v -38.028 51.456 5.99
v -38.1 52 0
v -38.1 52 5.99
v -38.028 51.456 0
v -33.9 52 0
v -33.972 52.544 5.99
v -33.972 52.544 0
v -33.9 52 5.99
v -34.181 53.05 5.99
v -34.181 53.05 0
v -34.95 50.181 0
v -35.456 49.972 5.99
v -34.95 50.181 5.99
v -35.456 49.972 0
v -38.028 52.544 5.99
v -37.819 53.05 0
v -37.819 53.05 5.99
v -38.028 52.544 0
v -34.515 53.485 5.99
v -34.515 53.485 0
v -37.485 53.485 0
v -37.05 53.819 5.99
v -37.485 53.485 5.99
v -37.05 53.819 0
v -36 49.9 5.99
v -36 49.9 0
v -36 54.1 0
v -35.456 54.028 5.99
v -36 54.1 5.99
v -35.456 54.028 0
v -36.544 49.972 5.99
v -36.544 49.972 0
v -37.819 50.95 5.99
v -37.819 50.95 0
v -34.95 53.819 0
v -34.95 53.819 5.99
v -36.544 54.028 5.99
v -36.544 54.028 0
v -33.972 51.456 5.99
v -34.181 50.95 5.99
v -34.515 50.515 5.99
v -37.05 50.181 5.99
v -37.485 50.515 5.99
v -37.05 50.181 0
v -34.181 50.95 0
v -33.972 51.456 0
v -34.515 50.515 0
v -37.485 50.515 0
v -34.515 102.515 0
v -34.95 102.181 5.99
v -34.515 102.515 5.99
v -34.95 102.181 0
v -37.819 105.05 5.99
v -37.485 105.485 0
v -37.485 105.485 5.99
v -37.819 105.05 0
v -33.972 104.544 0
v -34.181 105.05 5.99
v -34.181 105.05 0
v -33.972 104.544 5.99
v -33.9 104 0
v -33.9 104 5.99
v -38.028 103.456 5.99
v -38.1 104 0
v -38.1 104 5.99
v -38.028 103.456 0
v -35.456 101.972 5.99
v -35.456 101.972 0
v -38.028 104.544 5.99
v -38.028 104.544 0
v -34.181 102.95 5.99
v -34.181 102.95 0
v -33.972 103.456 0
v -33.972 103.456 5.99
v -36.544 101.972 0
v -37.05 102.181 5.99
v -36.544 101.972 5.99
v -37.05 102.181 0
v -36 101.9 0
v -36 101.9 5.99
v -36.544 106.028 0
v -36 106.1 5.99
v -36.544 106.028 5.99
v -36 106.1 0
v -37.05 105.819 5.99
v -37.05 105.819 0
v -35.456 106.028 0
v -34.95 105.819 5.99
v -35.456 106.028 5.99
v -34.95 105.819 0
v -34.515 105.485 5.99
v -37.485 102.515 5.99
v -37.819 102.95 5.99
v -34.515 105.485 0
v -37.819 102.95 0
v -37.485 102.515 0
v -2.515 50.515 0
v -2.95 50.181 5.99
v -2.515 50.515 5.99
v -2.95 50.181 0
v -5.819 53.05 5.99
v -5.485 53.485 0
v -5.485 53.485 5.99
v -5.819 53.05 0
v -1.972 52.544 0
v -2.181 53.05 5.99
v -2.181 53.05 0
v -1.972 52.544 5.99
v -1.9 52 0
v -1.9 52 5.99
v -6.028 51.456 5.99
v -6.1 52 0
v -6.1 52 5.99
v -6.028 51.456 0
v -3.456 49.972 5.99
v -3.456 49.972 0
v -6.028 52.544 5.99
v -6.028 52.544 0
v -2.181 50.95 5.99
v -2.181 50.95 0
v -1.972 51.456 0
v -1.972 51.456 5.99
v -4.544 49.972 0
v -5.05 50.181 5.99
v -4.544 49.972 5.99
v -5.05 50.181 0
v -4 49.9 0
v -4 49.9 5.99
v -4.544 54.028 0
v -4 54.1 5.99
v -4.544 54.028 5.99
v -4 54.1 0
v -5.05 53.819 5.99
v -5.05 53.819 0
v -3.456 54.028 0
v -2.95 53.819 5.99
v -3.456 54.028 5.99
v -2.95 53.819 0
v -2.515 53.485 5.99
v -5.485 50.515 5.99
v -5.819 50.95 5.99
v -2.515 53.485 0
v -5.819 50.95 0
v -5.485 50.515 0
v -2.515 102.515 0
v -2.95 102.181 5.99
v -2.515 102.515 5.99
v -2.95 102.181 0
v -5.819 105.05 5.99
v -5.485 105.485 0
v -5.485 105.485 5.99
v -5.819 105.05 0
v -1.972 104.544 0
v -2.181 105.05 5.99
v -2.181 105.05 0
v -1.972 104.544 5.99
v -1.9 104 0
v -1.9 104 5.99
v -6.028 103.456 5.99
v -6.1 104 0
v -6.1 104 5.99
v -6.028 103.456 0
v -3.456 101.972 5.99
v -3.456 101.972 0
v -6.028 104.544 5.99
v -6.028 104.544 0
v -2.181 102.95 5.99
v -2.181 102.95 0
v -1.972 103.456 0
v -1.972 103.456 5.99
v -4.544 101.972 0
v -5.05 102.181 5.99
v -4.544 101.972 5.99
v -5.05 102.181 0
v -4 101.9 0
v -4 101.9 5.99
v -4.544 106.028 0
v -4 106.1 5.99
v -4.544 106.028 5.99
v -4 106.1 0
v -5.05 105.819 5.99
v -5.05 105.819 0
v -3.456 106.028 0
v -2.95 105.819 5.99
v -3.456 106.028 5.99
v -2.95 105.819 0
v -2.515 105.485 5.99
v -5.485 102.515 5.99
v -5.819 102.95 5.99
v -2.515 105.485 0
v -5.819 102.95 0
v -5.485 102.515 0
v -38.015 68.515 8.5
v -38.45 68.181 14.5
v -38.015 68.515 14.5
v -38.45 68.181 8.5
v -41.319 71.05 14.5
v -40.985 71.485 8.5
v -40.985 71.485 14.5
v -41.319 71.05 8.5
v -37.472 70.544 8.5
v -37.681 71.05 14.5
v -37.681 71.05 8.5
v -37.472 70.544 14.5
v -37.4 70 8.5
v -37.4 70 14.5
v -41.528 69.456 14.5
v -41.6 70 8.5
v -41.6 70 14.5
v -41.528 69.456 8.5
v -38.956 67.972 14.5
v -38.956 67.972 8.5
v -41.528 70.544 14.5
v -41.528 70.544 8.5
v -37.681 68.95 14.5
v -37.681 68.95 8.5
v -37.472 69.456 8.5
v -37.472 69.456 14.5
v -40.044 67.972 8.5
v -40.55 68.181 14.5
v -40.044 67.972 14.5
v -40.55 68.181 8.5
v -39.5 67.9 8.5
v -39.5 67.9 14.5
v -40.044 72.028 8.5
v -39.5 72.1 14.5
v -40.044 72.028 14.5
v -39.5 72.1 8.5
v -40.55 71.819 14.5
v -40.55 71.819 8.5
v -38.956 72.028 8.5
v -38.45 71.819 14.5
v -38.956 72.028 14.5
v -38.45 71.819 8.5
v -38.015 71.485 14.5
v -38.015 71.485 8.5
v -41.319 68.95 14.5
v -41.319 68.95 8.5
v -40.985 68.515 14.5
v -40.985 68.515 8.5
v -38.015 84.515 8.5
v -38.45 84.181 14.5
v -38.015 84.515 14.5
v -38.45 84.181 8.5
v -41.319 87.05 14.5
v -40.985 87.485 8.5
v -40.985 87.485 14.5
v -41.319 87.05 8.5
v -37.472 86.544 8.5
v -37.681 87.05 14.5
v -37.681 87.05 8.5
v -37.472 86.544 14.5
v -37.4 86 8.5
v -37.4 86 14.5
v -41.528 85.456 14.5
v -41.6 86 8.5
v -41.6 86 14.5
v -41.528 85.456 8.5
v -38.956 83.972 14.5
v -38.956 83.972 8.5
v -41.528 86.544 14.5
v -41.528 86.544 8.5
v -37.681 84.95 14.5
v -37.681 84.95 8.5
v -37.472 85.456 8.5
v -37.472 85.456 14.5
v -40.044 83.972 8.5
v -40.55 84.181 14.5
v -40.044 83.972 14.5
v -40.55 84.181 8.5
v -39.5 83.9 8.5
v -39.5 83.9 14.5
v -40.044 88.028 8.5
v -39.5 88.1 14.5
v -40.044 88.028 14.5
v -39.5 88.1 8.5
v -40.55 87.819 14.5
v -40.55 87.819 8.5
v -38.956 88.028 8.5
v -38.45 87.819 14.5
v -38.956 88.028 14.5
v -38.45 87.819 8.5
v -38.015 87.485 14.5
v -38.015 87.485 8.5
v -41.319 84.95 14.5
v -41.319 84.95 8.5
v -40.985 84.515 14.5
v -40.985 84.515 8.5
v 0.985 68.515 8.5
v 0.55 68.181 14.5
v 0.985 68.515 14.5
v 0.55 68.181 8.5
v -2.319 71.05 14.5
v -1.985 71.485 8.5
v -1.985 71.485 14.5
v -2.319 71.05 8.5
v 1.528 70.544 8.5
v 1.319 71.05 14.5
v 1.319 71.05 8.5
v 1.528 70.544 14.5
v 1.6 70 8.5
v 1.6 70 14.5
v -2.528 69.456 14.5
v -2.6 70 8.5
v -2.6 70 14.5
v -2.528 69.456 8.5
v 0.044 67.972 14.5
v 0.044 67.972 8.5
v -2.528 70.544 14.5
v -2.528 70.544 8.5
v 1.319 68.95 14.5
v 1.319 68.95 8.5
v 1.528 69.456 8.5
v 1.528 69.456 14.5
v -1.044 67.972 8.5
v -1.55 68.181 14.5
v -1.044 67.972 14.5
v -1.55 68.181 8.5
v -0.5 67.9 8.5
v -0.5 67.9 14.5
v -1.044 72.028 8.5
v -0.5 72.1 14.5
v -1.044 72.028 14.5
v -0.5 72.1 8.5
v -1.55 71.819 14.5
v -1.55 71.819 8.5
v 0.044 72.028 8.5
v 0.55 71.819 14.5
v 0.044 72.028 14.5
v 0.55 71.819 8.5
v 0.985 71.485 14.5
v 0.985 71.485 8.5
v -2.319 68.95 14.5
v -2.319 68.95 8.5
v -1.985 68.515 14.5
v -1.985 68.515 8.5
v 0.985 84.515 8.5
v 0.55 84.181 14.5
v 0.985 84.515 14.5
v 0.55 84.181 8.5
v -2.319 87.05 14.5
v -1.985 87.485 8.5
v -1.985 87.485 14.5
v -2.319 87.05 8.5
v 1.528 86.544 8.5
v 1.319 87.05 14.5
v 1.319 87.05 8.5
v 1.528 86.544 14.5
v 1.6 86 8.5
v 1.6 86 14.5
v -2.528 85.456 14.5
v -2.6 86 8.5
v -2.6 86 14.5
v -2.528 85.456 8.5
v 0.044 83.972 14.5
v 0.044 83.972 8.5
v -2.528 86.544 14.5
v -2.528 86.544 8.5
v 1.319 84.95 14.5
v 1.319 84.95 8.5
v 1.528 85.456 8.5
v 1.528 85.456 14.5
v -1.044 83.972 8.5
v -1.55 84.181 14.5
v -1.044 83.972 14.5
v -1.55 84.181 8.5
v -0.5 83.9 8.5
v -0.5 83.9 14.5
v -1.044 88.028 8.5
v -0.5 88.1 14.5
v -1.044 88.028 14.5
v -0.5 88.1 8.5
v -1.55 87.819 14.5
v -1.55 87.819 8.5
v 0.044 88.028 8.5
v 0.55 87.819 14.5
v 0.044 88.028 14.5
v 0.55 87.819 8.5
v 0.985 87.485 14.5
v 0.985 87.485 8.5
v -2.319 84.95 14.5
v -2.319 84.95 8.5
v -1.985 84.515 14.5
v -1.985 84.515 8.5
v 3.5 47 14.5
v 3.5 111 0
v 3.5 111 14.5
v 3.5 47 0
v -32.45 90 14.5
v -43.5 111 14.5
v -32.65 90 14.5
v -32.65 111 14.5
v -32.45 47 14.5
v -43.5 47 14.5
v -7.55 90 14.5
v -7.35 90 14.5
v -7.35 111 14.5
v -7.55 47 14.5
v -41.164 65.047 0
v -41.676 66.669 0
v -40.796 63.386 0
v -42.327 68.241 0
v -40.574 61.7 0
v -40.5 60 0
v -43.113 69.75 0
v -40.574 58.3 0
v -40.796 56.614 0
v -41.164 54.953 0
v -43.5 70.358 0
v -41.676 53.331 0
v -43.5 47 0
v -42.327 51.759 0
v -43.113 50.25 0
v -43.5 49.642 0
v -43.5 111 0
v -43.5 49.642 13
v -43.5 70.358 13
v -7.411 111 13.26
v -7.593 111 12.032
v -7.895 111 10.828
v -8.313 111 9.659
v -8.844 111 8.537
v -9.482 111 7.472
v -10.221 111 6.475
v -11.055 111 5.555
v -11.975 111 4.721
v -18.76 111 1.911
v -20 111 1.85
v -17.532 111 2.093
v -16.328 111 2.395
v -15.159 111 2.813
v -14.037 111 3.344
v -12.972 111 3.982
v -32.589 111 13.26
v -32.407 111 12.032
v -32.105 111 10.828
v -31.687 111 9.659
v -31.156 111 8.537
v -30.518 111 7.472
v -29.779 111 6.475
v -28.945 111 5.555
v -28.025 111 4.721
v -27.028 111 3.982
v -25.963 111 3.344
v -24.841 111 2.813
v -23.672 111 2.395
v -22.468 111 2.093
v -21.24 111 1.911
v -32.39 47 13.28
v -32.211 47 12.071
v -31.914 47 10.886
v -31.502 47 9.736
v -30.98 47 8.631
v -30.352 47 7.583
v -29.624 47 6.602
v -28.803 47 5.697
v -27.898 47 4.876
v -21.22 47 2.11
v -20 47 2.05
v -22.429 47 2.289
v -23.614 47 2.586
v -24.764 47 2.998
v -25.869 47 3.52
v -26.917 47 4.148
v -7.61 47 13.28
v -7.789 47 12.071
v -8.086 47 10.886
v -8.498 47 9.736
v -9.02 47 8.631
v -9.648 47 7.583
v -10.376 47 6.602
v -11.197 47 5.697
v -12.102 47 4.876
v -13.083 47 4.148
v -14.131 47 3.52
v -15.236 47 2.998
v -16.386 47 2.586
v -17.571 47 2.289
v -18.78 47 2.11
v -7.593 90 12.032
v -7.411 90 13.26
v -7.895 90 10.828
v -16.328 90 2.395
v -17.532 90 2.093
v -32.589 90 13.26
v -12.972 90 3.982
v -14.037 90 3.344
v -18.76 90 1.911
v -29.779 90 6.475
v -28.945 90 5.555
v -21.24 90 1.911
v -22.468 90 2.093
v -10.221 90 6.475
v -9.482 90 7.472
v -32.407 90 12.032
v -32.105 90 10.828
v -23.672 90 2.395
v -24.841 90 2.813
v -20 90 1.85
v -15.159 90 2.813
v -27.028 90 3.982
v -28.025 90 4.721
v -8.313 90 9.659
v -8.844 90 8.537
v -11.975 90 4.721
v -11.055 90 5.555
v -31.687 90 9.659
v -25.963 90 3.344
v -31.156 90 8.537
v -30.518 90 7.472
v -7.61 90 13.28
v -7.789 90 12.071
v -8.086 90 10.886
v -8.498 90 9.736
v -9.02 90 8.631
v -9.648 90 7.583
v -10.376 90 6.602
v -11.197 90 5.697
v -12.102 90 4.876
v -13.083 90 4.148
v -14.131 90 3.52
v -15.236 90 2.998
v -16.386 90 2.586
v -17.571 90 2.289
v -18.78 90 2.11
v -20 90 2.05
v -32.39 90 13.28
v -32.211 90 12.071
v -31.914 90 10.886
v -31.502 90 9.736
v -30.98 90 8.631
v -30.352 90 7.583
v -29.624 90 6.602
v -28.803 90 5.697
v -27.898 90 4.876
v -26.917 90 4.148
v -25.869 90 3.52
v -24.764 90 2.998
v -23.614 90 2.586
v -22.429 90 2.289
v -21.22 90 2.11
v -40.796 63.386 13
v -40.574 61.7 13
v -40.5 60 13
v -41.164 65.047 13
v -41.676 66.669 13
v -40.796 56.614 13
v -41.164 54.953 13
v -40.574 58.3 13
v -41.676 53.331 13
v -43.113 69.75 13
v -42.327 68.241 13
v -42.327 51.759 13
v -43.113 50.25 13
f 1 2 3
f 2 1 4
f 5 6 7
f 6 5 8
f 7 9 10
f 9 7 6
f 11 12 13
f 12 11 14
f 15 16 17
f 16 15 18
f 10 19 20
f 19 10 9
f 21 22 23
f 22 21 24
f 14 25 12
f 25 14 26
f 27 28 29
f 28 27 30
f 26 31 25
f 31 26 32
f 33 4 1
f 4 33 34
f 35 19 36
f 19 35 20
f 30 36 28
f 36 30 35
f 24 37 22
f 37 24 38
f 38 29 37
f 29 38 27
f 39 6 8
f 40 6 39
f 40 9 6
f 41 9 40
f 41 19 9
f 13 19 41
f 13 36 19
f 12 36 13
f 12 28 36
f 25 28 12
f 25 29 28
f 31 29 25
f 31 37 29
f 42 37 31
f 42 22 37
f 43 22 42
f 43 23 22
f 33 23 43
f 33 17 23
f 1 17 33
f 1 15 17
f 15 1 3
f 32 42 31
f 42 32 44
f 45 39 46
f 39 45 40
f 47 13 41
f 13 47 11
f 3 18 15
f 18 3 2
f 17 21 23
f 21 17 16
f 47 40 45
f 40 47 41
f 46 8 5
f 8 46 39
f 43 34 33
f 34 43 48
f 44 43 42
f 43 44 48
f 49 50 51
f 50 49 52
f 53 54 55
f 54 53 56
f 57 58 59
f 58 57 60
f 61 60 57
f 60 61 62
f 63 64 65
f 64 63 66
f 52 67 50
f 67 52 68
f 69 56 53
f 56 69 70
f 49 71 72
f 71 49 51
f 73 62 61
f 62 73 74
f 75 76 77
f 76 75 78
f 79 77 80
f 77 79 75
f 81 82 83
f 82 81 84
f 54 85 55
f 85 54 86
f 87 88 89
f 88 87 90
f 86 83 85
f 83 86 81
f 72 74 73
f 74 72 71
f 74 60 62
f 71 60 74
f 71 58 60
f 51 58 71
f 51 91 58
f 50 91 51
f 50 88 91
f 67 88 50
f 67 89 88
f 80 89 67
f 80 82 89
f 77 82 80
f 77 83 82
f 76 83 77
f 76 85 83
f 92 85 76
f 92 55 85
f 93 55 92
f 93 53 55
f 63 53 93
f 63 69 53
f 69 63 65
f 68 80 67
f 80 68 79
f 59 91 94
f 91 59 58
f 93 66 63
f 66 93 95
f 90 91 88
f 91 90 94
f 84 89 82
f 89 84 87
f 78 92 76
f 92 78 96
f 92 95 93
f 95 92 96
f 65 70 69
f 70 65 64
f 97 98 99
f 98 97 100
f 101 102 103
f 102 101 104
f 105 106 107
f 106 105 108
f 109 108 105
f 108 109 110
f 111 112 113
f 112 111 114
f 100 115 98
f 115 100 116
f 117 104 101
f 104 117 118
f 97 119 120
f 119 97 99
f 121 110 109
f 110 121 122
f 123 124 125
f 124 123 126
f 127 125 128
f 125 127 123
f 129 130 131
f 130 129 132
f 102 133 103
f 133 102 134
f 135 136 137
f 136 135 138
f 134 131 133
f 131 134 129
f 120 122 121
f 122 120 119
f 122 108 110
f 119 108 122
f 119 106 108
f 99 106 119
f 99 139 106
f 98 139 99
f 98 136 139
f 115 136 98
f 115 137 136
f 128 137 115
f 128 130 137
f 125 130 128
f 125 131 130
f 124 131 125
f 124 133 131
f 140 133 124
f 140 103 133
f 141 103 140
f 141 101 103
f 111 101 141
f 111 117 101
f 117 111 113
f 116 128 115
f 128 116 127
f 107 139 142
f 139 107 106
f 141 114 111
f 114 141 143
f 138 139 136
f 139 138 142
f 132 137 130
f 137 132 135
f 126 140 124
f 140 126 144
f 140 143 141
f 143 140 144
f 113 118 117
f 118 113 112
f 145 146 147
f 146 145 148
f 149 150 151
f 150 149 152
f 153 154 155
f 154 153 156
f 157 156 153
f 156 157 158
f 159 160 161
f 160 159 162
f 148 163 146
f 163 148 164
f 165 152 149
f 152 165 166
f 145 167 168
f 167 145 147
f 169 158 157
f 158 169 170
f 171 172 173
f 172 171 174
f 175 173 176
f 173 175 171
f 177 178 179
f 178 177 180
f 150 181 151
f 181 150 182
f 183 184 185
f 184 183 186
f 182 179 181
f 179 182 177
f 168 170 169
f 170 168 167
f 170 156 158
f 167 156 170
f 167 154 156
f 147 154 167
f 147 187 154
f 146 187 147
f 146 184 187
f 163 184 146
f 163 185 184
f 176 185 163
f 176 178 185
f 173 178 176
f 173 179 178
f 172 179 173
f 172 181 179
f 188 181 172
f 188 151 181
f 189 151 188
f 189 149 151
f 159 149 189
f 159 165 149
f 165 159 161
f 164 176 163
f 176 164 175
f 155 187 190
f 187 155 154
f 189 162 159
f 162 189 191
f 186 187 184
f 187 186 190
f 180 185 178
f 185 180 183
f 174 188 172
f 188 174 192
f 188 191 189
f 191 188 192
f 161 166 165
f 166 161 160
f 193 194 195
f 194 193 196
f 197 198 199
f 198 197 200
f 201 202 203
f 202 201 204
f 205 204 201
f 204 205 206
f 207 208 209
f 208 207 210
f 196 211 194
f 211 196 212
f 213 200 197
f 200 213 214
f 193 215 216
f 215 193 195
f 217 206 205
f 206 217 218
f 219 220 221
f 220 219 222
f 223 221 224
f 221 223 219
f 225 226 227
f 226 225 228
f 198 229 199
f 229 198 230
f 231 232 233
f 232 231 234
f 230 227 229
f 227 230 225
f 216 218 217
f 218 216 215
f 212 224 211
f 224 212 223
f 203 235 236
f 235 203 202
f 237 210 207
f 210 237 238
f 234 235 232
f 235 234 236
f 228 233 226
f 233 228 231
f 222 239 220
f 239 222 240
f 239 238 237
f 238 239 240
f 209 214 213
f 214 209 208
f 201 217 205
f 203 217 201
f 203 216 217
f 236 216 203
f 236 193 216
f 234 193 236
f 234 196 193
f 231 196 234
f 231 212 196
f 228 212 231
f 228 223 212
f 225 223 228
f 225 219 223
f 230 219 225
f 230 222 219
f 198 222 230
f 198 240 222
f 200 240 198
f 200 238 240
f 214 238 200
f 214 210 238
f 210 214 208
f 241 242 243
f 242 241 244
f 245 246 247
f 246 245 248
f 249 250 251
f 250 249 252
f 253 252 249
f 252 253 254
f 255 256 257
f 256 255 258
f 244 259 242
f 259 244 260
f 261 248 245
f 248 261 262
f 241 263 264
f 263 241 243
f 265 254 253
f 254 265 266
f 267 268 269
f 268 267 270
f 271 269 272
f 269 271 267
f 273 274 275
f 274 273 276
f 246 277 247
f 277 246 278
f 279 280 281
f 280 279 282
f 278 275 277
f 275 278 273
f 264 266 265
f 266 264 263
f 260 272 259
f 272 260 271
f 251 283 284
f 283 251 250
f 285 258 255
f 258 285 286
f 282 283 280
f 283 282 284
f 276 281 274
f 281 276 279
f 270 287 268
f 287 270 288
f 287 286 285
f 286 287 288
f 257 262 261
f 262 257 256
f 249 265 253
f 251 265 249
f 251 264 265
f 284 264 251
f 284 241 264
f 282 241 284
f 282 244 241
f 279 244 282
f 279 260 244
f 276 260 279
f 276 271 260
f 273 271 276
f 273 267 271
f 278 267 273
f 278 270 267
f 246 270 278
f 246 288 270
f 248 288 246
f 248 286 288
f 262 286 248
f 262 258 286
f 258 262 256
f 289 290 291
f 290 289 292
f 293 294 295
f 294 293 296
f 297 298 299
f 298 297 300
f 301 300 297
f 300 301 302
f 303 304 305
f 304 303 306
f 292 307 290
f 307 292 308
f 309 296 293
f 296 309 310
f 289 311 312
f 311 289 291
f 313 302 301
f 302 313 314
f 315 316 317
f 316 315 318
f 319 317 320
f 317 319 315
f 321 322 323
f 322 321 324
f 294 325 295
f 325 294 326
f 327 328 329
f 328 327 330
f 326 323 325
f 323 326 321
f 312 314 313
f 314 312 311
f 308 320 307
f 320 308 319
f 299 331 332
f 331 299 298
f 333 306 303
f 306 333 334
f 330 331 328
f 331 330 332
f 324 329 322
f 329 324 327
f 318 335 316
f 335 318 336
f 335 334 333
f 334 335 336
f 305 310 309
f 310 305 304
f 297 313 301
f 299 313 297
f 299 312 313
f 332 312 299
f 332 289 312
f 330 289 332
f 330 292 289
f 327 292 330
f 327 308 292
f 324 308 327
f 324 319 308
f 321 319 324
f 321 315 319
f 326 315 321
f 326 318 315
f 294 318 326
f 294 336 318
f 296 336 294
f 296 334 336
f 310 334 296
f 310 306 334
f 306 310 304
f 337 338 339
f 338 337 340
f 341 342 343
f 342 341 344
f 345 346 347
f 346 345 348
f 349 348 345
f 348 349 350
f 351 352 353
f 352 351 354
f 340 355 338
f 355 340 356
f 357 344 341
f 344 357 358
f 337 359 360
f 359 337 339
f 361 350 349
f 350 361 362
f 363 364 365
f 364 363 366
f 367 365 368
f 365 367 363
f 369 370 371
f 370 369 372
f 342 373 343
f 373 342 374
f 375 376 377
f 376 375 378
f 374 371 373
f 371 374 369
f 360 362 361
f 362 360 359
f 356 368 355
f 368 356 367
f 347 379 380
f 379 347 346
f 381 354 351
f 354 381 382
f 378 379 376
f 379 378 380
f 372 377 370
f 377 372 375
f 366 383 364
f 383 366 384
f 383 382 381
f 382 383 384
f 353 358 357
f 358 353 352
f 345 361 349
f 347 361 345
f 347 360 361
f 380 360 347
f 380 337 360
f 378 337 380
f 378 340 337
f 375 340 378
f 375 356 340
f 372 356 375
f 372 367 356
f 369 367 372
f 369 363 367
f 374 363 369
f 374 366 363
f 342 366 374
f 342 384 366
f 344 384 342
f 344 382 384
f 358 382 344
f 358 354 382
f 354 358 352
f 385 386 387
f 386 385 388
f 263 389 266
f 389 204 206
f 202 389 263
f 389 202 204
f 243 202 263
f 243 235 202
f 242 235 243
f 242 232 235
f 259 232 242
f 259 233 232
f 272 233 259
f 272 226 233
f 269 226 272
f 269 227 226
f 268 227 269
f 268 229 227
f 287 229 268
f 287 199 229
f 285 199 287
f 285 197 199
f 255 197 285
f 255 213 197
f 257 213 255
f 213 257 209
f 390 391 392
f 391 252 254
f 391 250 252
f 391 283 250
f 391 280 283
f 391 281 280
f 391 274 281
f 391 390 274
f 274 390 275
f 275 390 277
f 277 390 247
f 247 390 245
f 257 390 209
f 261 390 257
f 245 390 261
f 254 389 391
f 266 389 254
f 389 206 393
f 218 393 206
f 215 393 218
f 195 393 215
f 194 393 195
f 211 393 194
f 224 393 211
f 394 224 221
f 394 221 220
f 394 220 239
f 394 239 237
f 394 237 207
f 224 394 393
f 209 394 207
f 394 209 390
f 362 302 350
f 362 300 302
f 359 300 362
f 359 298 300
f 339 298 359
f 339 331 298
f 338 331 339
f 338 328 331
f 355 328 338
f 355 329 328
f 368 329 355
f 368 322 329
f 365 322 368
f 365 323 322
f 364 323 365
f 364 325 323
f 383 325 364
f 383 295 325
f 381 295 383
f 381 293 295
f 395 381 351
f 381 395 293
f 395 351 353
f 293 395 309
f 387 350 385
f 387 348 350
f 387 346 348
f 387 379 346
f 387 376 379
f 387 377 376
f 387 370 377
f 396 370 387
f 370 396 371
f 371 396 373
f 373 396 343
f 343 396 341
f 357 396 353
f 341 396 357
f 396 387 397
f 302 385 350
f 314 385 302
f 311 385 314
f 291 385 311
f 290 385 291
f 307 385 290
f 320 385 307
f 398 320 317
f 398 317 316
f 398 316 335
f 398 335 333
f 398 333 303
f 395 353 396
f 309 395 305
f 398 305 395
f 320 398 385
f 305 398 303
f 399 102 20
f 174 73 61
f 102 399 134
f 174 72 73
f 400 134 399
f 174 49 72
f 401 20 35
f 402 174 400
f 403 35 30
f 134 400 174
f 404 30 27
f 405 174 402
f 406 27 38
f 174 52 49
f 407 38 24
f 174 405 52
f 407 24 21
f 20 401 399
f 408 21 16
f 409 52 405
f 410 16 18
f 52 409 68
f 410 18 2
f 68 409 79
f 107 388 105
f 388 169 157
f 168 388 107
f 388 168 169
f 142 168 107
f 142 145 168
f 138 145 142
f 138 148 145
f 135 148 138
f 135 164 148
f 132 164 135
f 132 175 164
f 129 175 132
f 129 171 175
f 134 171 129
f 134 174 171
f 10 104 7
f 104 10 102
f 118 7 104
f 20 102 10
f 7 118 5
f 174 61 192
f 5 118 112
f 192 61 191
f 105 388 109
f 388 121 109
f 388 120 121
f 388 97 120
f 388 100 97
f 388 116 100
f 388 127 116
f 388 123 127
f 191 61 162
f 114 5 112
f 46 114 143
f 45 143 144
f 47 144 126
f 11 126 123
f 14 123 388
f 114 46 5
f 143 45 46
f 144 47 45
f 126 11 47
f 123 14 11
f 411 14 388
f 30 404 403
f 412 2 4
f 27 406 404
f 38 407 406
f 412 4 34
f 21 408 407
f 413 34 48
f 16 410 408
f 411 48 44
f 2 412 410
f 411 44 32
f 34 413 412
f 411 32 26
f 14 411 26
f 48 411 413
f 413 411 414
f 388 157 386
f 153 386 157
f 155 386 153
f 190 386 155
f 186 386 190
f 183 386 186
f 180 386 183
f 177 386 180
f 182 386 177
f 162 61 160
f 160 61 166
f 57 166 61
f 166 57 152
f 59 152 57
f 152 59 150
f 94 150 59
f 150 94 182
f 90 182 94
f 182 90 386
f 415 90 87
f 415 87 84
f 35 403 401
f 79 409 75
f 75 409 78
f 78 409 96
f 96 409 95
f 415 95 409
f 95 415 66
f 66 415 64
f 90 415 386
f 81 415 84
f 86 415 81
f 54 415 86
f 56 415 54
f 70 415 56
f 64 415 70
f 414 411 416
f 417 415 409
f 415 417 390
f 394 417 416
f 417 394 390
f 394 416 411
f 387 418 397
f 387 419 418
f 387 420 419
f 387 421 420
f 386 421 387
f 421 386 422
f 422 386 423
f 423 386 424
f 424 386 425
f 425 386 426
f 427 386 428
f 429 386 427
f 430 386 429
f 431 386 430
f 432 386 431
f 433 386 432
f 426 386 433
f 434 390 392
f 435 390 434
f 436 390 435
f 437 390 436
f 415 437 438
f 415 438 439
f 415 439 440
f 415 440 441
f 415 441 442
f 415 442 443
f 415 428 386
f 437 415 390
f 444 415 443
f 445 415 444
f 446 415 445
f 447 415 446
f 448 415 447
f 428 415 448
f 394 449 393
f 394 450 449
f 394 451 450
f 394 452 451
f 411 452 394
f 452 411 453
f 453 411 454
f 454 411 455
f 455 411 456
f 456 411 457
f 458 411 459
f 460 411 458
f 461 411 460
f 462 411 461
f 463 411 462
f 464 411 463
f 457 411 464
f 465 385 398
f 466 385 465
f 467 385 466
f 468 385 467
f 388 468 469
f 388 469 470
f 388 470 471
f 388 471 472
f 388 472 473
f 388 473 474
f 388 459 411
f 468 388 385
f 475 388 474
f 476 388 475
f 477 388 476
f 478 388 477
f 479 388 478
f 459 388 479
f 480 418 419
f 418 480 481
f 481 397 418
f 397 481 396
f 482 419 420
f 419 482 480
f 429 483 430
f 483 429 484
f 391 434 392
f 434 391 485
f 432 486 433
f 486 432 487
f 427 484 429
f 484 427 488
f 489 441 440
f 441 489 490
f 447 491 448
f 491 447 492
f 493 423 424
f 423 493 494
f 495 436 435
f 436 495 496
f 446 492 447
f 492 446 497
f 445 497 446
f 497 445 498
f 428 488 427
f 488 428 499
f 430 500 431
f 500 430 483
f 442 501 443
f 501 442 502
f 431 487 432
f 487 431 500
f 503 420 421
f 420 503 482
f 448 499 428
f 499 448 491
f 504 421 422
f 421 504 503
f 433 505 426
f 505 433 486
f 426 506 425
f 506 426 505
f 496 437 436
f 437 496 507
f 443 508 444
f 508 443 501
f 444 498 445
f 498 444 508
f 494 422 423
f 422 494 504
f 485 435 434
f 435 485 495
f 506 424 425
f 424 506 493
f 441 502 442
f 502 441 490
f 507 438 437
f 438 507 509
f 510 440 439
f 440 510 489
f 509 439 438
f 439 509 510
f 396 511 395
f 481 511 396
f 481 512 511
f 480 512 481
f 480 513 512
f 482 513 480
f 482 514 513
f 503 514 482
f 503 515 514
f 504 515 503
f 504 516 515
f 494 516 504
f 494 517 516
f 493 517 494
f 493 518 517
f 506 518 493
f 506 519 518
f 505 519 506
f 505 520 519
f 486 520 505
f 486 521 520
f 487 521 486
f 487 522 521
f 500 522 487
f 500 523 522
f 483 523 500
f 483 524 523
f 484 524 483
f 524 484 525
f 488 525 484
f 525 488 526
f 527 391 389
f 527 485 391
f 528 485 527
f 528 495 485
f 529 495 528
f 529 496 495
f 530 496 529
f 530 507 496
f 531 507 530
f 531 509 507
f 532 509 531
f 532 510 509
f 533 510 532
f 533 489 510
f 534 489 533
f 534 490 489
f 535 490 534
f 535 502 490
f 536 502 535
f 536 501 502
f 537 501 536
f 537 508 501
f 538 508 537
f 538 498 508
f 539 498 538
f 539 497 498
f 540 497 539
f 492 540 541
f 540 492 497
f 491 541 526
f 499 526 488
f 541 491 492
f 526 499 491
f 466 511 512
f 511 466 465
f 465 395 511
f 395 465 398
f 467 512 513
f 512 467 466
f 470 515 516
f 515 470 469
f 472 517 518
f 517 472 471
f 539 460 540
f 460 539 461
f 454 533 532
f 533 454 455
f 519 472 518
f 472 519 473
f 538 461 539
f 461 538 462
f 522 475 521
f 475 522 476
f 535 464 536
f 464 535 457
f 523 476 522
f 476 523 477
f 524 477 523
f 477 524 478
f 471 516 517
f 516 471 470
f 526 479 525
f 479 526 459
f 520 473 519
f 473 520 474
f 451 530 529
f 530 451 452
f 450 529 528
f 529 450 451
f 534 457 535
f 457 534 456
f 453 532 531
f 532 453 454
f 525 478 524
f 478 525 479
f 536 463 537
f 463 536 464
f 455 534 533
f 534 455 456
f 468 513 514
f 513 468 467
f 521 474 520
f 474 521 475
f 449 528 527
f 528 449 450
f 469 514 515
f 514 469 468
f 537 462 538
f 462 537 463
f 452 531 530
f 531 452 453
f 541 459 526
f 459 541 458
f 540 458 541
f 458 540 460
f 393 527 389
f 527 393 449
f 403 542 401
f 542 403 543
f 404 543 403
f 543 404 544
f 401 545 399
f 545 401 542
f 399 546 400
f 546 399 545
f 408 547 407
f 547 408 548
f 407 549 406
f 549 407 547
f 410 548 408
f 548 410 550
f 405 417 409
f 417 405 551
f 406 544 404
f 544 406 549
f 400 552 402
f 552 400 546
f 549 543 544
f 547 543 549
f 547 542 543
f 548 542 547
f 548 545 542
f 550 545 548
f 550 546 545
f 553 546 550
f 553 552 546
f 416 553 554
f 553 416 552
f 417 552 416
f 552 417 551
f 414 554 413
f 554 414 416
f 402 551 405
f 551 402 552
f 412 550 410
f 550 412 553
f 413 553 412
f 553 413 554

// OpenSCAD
// =====================================================================
//  robot base :: motor bracket (print 2: one per side, mirror pair)
//  Saddle block on the floor plate cradling the JGA25 gearbox and can (lower
//  half up to the axis plane z 32.5; motor underside z 20). The upper half is
//  closed by 2 separate straps (parts/robot_motor_strap.scad, print 4 total)
//  screwed down into M3 heat-set inserts in the two ear pairs.
//  Fixing: 4x M3 from below into inserts in the bottom at rb_fix_motor.
//  Hardware per bracket: 4x M3x10 (floor), 4x M3 inserts bottom + 4 top ears.
//  Print orientation: assembled (floor face down), saddle open upward, no supports.
//  The bracket stays at |y| 47 .. 111 (hub starts at 115, gearbox face at 113).
//  robot_motor_bracket(side)  side = +1 (left) / -1 (right), robot frame.
// =====================================================================
include <../lib/params.scad>
include <../lib/robot_params.scad>

rbmb_y   = [47, 111];
rbmb_hw  = 23.5;                       // half width (x)
rbmb_ear_x = 19.5;                     // strap screw x offset from the axle
rbmb_strap_y = [70, 86];               // strap centres (over the can, y 64 .. 92); first one moved off the pillar flange
function rbmb_ear_pts() = [for (x = [-1, 1], y = rbmb_strap_y) [rb_axle_x + x * rbmb_ear_x, y]];

module rbmb_left() {
    z0 = rb_floor_top;
    difference() {
        translate([rb_axle_x - rbmb_hw, rbmb_y[0], z0]) cube([2 * rbmb_hw, rbmb_y[1] - rbmb_y[0], rb_axle_z - z0]);
        // gearbox (y > 90) and can/encoder bores, axis along Y at the top plane
        translate([rb_axle_x, 90, rb_axle_z]) rotate([-90, 0, 0]) cylinder(h = 30, d = jga25_gear[0] + 0.3, $fn = 64);
        translate([rb_axle_x, 40, rb_axle_z]) rotate([-90, 0, 0]) cylinder(h = 51, d = jga25_motor[0] + 0.5, $fn = 64);
        // relief around the pillar flange (d 38 at (-60, 60), 0.5 clearance)
        translate([bay_screw_xy[1][0], bay_screw_xy[1][1], z0 - 1]) cylinder(h = 14, d = 39, $fn = 72);
        // bottom inserts (floor fixings)
        for (p = rb_fix_motor) if (p[1] > 0)
            translate([p[0], p[1], z0 - 0.01]) cylinder(h = m3_insert_h + 1, d = m3_insert_d, $fn = 24);
        // strap screw inserts from the top
        for (p = rbmb_ear_pts())
            translate([p[0], p[1], rb_axle_z - m3_insert_h - 1]) cylinder(h = m3_insert_h + 1.01, d = m3_insert_d, $fn = 24);
    }
}

module robot_motor_bracket(side = 1) { mirror([0, side < 0 ? 1 : 0, 0]) rbmb_left(); }

module robot_motor_bracket_print() { translate([0, 0, -rb_floor_top]) robot_motor_bracket(1); }

robot_motor_bracket_print();
